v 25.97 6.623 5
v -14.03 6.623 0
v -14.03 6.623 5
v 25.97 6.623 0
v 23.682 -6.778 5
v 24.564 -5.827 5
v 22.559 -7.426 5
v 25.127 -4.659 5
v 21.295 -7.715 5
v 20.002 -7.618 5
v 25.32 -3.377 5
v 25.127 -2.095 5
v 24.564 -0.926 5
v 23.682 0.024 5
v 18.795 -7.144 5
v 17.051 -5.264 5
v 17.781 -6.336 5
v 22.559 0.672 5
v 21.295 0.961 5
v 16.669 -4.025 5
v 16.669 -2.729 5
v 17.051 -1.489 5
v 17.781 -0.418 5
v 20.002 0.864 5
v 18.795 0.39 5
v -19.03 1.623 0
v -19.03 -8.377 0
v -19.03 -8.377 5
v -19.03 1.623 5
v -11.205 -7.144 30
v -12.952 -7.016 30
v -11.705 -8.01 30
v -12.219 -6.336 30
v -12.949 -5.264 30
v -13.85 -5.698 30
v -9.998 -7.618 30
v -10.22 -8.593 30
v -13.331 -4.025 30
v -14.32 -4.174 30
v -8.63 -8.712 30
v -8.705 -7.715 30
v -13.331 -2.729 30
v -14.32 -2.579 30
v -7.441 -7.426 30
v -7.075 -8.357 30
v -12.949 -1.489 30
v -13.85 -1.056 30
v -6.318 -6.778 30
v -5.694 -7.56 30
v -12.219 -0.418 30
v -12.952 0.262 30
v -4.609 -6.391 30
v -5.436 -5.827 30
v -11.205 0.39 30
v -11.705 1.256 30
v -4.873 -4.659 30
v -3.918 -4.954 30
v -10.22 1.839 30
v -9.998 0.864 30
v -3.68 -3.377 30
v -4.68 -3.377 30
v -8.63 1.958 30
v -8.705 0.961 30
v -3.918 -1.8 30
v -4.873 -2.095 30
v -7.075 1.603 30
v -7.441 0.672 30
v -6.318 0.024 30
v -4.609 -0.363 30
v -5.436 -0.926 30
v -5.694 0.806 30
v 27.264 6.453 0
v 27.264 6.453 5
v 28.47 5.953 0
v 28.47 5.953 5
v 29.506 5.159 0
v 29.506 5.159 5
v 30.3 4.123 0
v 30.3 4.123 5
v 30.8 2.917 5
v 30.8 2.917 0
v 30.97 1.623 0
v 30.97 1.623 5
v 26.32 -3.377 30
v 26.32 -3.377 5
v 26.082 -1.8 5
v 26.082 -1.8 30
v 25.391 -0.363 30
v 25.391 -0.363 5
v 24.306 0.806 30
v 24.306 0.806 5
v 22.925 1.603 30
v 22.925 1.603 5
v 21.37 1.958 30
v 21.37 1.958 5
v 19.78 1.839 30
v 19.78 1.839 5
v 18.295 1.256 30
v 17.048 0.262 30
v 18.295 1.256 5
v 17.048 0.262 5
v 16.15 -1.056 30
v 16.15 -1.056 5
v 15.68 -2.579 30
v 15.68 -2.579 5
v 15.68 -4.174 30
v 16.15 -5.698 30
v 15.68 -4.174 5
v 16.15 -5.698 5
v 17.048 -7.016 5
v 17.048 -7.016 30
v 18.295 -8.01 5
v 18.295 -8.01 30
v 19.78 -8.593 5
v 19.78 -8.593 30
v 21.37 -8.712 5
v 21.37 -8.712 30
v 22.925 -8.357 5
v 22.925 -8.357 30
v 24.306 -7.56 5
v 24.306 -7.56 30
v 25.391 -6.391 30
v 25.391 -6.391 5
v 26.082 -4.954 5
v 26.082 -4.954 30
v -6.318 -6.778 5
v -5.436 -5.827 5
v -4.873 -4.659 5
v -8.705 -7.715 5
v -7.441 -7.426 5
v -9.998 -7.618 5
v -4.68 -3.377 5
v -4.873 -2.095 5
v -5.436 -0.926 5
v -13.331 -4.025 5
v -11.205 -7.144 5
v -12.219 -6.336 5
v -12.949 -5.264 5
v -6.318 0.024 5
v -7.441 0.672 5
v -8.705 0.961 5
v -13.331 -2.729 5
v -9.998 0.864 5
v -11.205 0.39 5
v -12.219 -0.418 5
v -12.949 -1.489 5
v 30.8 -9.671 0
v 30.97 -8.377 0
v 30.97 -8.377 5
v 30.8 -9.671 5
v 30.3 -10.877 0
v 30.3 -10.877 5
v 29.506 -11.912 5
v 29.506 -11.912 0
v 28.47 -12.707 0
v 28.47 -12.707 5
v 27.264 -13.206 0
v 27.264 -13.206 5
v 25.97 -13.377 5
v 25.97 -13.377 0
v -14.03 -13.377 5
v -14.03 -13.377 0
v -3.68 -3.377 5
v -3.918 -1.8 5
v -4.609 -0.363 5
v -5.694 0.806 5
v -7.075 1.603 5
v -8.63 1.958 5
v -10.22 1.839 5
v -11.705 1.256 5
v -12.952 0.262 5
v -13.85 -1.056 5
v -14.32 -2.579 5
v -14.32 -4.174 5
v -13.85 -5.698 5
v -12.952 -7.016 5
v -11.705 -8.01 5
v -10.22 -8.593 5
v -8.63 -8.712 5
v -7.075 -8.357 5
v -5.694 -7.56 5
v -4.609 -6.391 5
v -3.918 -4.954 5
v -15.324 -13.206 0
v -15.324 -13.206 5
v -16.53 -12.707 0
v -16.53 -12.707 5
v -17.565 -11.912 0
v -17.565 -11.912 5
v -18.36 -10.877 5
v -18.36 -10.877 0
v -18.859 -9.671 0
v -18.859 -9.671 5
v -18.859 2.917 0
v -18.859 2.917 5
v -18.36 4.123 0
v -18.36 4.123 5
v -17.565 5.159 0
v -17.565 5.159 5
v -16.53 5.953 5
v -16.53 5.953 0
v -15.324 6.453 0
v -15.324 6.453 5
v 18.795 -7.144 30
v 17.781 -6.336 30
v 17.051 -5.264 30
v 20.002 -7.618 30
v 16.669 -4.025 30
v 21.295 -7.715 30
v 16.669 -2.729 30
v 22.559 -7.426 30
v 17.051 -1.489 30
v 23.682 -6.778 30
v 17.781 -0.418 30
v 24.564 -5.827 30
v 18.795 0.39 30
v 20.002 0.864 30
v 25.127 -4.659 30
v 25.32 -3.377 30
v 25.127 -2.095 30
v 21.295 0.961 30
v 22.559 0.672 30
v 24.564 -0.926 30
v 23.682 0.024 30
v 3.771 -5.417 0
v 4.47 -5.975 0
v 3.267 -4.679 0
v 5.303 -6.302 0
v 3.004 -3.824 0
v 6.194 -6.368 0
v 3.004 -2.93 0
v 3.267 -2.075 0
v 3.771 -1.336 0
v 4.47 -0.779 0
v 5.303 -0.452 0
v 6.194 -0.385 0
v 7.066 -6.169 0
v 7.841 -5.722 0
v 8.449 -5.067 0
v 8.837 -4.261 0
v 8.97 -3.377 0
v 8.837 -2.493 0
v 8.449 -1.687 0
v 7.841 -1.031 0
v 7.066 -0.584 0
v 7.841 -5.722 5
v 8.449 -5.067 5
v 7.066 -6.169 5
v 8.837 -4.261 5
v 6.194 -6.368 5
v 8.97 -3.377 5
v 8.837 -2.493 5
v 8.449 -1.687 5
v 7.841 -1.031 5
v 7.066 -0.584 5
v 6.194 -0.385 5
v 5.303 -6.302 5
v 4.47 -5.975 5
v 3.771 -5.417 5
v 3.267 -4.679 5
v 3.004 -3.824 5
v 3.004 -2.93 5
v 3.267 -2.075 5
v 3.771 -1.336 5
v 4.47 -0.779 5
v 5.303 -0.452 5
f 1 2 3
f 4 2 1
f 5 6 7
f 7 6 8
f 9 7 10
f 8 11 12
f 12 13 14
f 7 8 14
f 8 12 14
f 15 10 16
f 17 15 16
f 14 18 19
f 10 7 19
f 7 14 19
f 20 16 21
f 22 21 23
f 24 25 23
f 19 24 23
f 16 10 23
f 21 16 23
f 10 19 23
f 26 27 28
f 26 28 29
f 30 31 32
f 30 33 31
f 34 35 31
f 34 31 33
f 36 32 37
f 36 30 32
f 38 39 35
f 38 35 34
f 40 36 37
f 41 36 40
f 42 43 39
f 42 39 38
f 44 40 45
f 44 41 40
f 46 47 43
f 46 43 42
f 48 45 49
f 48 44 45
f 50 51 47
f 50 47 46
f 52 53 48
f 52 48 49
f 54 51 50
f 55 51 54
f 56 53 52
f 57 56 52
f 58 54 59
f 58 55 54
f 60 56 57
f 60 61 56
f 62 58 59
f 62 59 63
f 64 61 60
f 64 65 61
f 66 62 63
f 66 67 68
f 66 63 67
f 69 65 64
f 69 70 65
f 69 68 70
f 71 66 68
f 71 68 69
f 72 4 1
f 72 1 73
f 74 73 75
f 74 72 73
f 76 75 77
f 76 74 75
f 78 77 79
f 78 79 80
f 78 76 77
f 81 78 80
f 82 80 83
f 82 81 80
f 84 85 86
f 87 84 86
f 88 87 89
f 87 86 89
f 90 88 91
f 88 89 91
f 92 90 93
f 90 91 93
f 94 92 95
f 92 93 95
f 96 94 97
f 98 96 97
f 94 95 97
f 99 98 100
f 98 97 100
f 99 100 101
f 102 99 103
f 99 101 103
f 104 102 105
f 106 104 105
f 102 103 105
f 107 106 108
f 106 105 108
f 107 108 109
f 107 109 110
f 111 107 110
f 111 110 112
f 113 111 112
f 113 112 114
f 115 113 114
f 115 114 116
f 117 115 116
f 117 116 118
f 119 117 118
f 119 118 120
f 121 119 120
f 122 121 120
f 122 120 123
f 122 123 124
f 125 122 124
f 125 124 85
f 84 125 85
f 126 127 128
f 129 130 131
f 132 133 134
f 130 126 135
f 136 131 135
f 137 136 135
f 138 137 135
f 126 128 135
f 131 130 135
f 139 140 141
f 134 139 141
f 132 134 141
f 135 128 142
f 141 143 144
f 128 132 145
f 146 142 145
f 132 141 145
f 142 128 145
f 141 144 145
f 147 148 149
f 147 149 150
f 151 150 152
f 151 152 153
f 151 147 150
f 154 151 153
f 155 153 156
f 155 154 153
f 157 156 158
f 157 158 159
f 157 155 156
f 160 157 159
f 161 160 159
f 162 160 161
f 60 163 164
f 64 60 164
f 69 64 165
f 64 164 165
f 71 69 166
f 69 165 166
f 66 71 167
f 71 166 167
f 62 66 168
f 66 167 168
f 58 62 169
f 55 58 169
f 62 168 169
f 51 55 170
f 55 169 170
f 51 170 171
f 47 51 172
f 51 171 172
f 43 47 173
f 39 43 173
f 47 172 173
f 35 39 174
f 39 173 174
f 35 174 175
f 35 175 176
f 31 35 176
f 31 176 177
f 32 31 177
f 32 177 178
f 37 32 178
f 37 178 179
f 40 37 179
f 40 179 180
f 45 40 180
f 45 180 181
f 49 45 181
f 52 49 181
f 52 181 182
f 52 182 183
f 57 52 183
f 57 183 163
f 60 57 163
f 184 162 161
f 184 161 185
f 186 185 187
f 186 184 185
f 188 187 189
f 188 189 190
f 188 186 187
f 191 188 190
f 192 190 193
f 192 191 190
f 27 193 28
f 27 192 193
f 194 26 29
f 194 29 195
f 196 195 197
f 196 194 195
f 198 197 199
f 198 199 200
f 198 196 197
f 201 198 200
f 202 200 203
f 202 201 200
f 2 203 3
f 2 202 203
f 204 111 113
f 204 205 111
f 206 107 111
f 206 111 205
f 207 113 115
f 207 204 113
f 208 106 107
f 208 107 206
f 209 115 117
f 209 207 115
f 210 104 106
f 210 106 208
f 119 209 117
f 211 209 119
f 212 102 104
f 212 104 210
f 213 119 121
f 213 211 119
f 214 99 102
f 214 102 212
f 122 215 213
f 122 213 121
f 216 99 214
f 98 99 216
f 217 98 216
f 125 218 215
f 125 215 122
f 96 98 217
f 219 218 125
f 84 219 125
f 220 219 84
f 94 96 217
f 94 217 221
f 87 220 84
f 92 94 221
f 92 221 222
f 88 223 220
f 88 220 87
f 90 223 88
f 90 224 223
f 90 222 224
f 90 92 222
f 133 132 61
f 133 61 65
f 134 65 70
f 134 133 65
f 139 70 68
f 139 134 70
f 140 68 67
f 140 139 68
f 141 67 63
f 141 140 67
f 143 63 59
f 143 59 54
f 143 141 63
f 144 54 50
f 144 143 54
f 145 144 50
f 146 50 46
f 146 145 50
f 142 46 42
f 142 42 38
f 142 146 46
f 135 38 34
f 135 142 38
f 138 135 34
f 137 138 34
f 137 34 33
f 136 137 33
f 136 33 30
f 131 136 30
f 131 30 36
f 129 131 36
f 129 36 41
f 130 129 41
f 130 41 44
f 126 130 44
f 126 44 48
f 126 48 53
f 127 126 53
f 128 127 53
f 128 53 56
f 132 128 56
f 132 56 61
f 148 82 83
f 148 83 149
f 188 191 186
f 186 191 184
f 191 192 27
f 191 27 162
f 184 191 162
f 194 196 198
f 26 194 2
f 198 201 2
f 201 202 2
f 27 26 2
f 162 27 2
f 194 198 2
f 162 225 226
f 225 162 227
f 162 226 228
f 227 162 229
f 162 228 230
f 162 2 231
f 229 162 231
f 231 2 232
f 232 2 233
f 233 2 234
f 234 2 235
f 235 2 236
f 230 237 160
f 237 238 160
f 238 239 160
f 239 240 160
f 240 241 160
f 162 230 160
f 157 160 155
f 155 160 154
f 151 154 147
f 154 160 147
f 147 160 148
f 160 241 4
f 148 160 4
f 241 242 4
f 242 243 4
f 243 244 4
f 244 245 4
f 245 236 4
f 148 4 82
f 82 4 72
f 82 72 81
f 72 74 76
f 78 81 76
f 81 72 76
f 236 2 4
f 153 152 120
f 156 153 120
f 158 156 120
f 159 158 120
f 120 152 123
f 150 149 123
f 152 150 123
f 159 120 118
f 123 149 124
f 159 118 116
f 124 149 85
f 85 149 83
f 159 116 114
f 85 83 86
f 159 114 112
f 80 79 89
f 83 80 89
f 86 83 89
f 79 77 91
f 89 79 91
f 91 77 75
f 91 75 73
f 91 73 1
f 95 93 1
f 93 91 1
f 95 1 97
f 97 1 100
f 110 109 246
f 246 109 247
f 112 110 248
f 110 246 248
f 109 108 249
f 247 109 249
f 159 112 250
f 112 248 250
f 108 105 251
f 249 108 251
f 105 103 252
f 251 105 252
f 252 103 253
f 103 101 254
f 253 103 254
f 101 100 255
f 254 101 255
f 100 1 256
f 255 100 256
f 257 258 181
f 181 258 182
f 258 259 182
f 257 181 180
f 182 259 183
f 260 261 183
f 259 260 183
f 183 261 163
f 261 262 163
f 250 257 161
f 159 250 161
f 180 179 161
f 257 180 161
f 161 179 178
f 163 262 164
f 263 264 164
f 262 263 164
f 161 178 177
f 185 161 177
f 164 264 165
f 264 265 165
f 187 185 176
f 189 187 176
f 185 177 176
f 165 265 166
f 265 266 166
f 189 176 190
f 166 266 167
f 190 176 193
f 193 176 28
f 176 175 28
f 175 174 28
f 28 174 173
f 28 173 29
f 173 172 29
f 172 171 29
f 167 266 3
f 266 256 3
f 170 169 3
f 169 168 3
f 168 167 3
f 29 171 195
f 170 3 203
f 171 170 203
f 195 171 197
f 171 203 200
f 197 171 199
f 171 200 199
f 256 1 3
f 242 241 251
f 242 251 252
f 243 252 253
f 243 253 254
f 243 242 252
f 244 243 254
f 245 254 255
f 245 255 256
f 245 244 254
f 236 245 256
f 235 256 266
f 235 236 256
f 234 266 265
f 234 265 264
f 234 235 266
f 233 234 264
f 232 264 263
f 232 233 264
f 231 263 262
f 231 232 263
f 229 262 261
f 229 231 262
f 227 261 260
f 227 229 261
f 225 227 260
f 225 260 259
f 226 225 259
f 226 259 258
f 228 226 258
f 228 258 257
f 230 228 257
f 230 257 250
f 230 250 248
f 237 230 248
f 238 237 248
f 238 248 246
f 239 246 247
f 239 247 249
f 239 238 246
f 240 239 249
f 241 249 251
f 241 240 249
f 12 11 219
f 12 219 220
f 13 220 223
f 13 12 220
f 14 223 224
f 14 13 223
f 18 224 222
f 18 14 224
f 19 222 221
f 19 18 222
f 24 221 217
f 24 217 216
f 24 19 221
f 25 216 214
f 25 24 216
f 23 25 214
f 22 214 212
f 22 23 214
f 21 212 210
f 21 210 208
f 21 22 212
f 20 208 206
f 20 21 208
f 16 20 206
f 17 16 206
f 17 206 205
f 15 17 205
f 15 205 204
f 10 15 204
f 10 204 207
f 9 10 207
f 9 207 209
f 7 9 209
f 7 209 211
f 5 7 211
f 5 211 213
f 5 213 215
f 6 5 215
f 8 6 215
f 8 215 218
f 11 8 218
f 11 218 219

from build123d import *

# Parameters (mm, degrees)
SKETCH1_R           = 4.85
SKETCH1_R_2         = 3
BOSS_EXTRUDE5_DEPTH = 5
SKETCH1_7_R         = 4.85
BOSS_EXTRUDE6_DEPTH = 5
SKETCH1_8_R         = 5.35
SKETCH1_8_R_2       = 4.35
EXTRUDE_THIN1_DEPTH = 30


with BuildPart() as part:
    # Sketch1 → Boss-Extrude5 (new body)
    with BuildSketch(Plane.XY):
        with BuildLine():
            Line((-14.029850746, 6.623134328), (25.970149254, 6.623134328))
            ThreePointArc((25.970149254, 6.623134328), (29.50568316, 5.158668234), (30.970149254, 1.623134328))
            Line((30.970149254, 1.623134328), (30.970149254, -8.376865672))
            ThreePointArc((30.970149254, -8.376865672), (29.50568316, -11.912399578), (25.970149254, -13.376865672))
            Line((25.970149254, -13.376865672), (-14.029850746, -13.376865672))
            ThreePointArc((-14.029850746, -13.376865672), (-17.565384652, -11.912399578), (-19.029850746, -8.376865672))
            Line((-19.029850746, -8.376865672), (-19.029850746, 1.623134328))
            ThreePointArc((-19.029850746, 1.623134328), (-17.565384652, 5.158668234), (-14.029850746, 6.623134328))
        make_face()
        with Locations((-9.029850746, -3.376865672)):
            Circle(SKETCH1_R, mode=Mode.SUBTRACT)
        with Locations((20.970149254, -3.376865672)):
            Circle(SKETCH1_R, mode=Mode.SUBTRACT)
        with Locations((5.970149254, -3.376865672)):
            Circle(SKETCH1_R_2, mode=Mode.SUBTRACT)
    extrude(amount=BOSS_EXTRUDE5_DEPTH)

    # Sketch1<7> → Boss-Extrude6 (add)
    with BuildSketch(Plane.XY):
        with Locations((-9.029850746, -3.376865672)):
            Circle(SKETCH1_7_R)
        with Locations((20.970149254, -3.376865672)):
            Circle(SKETCH1_7_R)
    extrude(amount=BOSS_EXTRUDE6_DEPTH)

    # Sketch1<8> → Extrude-Thin1 (add)
    with BuildSketch(Plane.XY):
        with Locations((-9.029850746, -3.376865672)):
            Circle(SKETCH1_8_R)
        with Locations((-9.029850746, -3.376865672)):
            Circle(SKETCH1_8_R_2, mode=Mode.SUBTRACT)
        with Locations((20.970149254, -3.376865672)):
            Circle(SKETCH1_8_R)
        with Locations((20.970149254, -3.376865672)):
            Circle(SKETCH1_8_R_2, mode=Mode.SUBTRACT)
    extrude(amount=EXTRUDE_THIN1_DEPTH)


solid = part.part
